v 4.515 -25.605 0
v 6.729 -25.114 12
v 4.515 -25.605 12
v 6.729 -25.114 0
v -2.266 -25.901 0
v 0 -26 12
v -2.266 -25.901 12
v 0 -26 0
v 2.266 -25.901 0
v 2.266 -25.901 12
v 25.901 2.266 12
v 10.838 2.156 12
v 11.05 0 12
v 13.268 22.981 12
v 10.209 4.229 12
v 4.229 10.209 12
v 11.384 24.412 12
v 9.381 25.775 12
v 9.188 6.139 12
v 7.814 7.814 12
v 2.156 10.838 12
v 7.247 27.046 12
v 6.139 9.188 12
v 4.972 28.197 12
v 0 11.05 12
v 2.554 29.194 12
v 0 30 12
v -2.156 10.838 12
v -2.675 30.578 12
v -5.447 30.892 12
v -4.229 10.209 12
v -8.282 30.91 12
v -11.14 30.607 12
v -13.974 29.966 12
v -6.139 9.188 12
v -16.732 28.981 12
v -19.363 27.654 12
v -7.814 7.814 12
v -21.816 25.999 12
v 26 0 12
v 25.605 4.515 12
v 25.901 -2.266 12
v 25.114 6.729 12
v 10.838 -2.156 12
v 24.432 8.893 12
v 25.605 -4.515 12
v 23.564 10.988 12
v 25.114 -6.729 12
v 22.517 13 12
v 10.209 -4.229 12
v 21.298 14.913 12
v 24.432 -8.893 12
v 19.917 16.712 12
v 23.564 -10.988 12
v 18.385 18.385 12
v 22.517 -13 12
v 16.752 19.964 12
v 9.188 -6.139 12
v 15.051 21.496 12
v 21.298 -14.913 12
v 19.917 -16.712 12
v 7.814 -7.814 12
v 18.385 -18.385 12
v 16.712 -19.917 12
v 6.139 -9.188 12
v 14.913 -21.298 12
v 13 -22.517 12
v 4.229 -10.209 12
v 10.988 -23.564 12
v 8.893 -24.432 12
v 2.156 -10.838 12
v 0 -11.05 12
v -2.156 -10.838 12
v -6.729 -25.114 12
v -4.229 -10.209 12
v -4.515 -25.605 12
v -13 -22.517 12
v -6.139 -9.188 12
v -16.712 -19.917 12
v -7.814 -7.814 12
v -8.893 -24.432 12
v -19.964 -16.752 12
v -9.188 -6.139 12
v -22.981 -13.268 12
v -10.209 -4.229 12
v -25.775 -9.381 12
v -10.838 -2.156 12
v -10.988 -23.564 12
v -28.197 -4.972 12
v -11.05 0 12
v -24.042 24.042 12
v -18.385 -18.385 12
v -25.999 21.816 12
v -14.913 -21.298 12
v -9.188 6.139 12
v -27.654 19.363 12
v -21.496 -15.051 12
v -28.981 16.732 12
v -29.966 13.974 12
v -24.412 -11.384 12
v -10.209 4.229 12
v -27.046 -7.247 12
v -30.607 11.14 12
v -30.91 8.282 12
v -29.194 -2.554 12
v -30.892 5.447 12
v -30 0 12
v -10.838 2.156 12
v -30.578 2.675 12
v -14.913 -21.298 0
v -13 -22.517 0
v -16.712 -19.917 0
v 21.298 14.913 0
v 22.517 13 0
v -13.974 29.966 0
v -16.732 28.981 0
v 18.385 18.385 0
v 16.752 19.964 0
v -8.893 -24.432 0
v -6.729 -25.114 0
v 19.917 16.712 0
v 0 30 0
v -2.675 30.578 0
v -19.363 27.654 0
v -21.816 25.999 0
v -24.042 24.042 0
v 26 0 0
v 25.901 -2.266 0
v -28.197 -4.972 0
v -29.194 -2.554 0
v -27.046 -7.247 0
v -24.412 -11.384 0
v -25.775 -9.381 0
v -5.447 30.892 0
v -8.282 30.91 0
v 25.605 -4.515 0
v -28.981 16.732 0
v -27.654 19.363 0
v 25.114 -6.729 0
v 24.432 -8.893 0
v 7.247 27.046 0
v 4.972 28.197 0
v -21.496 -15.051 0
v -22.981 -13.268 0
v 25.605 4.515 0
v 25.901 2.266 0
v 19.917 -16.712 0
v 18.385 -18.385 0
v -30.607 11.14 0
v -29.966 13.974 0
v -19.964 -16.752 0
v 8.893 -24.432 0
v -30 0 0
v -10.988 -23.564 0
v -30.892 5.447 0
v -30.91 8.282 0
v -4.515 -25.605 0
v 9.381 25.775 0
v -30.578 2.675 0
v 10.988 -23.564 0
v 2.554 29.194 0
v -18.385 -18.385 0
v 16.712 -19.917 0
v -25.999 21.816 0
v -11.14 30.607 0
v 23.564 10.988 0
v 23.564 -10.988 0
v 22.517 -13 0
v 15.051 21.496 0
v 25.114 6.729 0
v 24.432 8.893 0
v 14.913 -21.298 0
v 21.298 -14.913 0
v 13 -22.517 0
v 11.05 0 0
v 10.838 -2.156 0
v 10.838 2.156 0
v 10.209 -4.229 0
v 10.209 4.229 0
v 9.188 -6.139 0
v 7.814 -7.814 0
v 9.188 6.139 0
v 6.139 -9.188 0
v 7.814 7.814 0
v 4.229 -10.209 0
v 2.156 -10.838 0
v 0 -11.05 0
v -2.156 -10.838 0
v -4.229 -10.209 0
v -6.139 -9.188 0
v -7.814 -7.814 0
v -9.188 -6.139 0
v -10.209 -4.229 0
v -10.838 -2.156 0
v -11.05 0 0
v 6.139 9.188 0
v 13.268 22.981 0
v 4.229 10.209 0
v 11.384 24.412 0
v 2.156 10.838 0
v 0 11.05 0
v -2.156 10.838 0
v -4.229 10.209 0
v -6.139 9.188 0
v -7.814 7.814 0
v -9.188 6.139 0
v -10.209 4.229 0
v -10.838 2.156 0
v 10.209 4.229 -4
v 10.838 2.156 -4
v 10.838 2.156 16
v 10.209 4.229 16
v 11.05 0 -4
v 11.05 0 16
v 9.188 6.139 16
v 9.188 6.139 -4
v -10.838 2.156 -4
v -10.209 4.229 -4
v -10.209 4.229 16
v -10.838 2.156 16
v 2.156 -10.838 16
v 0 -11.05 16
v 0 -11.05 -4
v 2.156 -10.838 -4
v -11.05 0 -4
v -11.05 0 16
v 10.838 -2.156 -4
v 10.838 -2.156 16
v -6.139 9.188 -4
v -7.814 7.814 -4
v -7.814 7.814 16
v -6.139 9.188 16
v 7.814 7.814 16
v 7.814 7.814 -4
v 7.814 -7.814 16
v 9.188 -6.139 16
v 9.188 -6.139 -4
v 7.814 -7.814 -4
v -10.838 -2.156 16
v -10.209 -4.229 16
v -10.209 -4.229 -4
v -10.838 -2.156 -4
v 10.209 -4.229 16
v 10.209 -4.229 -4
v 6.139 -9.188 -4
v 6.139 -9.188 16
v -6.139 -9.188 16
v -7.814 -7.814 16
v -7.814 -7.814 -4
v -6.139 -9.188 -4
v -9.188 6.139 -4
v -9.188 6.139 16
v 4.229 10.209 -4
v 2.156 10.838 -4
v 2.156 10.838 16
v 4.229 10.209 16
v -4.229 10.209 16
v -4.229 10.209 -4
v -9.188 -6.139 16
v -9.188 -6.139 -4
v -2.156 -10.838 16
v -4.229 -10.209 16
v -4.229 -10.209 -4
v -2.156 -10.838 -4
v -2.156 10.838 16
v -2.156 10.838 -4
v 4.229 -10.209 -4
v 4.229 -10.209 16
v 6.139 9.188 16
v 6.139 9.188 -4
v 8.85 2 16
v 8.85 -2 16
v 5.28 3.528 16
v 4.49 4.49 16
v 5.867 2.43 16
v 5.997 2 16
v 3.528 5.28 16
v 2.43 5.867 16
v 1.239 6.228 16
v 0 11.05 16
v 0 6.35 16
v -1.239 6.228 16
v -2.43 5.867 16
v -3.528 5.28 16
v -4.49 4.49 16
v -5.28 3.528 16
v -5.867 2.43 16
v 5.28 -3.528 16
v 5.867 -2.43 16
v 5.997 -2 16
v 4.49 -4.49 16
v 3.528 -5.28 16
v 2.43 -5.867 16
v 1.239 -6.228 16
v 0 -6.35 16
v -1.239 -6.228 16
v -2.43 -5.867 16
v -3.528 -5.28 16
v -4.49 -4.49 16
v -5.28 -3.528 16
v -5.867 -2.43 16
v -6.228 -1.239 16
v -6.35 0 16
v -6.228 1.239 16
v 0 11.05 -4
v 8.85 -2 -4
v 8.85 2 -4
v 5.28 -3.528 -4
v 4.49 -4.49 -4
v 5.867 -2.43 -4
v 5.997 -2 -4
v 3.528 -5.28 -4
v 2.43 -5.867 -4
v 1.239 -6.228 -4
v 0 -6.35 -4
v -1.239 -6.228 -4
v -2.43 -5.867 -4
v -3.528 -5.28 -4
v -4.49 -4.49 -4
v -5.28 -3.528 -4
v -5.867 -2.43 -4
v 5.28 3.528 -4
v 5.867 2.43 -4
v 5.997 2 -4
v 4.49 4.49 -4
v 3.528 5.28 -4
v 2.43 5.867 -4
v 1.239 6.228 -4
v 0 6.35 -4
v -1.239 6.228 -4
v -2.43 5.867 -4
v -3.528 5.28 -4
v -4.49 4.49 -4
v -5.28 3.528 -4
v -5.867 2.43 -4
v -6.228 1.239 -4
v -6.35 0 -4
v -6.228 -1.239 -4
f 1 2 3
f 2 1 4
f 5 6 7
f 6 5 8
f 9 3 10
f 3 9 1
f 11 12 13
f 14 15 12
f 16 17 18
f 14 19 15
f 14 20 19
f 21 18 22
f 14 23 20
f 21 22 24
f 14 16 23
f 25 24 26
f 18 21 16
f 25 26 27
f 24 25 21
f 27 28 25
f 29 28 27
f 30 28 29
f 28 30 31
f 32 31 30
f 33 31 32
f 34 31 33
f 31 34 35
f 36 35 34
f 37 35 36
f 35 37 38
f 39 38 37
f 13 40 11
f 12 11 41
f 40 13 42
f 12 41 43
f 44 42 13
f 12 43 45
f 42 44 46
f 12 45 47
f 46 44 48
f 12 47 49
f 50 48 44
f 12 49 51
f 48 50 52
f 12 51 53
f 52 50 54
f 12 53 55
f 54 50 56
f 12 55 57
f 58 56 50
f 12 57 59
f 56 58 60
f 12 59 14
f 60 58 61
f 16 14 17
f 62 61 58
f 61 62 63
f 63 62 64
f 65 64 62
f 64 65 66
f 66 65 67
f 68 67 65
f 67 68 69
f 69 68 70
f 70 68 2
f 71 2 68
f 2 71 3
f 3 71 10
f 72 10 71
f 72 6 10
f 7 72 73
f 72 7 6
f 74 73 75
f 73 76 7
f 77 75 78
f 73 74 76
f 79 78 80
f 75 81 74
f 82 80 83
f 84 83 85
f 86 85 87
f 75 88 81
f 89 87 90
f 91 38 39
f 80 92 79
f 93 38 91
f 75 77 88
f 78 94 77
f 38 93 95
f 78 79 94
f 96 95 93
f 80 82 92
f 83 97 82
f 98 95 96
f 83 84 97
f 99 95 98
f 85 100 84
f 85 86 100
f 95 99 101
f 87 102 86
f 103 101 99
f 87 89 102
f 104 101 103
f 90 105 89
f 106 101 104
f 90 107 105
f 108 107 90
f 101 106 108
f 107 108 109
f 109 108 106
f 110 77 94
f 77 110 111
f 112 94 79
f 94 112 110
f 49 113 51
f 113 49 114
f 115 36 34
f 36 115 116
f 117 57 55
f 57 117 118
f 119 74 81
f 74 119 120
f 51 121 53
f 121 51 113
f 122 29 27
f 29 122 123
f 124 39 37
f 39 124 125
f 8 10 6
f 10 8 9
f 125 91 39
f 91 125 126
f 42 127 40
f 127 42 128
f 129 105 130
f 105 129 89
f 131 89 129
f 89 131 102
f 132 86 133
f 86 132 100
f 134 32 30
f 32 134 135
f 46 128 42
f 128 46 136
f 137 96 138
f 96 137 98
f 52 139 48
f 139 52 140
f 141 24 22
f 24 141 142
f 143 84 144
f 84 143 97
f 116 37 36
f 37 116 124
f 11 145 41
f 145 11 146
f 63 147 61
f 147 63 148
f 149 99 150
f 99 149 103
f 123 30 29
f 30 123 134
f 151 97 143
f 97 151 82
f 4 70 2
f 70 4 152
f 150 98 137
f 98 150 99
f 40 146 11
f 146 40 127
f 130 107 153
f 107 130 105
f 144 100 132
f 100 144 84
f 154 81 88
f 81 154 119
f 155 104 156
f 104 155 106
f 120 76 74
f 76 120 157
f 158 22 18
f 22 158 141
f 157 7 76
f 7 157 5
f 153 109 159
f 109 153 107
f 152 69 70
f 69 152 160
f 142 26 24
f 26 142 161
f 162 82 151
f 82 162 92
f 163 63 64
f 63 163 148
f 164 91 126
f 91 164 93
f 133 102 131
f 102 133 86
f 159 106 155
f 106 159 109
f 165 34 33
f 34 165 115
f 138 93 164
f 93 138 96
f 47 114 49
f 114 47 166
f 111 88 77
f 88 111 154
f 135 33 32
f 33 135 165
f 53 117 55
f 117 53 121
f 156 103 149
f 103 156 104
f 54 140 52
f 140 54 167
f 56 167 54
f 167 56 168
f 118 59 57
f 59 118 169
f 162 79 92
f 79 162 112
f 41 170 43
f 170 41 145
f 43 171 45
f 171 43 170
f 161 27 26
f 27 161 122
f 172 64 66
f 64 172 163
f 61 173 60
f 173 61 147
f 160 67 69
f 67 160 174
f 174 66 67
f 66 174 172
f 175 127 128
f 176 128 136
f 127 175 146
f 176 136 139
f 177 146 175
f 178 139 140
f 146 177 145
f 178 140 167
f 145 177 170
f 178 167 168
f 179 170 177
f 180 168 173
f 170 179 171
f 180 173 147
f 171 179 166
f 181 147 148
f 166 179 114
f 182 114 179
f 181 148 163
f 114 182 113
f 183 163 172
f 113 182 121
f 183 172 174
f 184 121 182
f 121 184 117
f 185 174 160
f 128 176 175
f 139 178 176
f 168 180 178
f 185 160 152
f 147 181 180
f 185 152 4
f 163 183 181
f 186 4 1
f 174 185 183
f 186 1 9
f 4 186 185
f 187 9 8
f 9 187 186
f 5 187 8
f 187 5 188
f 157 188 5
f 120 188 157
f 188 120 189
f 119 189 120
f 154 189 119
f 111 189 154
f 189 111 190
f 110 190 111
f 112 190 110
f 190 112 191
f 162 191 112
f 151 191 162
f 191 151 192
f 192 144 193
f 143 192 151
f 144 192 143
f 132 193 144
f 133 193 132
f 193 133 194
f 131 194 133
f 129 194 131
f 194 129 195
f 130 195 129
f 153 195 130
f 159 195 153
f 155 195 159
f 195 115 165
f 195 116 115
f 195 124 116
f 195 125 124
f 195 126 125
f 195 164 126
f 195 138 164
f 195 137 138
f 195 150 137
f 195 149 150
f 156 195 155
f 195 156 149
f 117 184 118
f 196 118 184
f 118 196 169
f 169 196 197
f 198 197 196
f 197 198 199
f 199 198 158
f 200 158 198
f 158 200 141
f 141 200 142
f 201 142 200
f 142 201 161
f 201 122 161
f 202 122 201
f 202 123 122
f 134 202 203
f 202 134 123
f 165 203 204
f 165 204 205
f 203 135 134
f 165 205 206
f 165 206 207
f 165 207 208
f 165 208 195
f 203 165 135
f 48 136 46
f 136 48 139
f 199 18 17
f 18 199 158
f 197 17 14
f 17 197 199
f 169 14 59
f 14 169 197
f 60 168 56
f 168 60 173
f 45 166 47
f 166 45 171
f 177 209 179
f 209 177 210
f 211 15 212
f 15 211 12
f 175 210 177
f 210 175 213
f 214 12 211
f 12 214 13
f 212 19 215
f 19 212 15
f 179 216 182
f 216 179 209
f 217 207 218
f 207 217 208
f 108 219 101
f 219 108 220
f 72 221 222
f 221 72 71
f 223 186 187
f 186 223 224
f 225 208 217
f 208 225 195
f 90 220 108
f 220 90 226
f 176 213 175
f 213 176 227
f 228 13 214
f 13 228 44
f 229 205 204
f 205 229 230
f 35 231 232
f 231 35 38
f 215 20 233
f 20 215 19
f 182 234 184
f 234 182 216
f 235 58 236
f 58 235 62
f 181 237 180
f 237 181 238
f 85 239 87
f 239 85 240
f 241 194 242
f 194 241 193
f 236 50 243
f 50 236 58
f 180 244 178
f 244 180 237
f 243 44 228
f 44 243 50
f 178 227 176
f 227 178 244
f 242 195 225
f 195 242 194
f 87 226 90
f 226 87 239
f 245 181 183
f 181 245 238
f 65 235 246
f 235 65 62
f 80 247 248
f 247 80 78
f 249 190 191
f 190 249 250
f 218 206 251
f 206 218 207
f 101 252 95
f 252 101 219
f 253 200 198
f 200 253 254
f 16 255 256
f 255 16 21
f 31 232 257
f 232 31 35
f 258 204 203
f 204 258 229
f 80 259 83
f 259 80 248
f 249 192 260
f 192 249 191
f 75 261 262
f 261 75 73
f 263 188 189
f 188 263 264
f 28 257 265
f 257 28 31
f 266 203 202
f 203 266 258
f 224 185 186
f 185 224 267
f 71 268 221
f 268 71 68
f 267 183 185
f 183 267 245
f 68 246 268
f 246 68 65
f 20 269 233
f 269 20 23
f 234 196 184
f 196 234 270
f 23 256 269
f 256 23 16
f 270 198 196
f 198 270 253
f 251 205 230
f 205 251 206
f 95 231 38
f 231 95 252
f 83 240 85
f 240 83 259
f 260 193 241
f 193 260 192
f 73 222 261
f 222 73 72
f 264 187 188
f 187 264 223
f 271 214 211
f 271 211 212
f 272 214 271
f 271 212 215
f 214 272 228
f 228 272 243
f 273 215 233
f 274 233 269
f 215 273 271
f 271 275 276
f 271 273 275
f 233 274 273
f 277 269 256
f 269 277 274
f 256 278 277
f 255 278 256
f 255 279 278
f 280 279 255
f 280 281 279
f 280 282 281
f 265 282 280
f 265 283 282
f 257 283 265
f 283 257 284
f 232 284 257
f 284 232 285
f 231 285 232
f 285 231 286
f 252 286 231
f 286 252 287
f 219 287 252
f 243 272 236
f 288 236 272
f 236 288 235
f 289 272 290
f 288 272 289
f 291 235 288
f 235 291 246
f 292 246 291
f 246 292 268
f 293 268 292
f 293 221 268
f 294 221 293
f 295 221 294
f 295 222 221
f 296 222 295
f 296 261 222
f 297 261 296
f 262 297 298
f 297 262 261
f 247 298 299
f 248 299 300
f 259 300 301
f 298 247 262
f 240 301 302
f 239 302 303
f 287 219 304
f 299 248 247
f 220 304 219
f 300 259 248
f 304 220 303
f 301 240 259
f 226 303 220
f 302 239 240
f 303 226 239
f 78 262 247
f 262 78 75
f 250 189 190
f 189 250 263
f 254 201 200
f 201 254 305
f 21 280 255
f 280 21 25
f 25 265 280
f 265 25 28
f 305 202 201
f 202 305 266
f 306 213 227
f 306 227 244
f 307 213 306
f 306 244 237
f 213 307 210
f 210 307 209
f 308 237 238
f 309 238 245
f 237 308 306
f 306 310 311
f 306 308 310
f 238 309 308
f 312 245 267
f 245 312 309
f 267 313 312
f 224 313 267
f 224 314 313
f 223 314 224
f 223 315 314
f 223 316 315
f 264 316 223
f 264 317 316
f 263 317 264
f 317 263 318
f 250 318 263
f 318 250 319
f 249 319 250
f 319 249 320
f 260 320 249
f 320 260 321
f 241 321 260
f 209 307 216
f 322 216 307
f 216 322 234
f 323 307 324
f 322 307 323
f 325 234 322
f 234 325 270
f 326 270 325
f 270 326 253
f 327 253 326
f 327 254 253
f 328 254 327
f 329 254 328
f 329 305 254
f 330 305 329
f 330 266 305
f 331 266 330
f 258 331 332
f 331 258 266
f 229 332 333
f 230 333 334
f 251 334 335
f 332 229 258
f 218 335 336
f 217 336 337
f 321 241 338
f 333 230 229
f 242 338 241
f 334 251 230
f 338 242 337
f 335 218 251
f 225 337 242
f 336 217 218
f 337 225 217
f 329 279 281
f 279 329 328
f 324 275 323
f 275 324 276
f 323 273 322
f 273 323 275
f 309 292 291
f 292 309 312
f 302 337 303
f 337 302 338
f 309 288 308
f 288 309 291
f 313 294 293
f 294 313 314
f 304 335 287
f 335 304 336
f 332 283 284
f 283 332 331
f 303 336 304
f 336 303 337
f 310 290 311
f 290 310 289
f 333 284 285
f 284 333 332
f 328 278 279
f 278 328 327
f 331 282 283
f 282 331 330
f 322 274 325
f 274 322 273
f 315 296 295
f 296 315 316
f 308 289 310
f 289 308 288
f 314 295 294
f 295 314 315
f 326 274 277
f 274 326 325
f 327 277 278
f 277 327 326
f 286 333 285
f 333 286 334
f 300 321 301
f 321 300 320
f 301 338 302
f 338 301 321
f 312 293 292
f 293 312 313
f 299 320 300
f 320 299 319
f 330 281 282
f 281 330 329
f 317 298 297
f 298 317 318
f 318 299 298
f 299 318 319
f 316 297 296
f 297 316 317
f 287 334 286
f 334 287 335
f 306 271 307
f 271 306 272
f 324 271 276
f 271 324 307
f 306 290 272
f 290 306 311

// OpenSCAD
$fn = 32;

// ----------------------------------------------------------------------
// Cam: base radius 26 mm with a 8 mm lift over 180 degrees
// ----------------------------------------------------------------------

// --- parameters (mm) ---
base_r = 26;              // base radius
lift = 8;                 // lift height above the base radius
lift_span = 180;          // angular width of the lift
lift_start = 45;          // angle where the lift starts
cam_t = 12;               // cam plate thickness
hub_d = 22.1;             // hub diameter
hub_h = 20;               // hub height
bore_d = 12.7;            // bore
key_w = 4;                // keyway width
key_depth = 2;            // keyway depth

cam_profile = [[26, 0], [25.901, 2.266], [25.605, 4.515], [25.114, 6.729], [24.432, 8.893], [23.564, 10.988], [22.517, 13], [21.298, 14.913], [19.917, 16.712], [18.385, 18.385], [16.752, 19.964], [15.051, 21.496], [13.268, 22.981], [11.384, 24.412], [9.381, 25.775], [7.247, 27.046], [4.972, 28.197], [2.554, 29.194], [0, 30], [-2.675, 30.578], [-5.447, 30.892], [-8.282, 30.91], [-11.14, 30.607], [-13.974, 29.966], [-16.732, 28.981], [-19.363, 27.654], [-21.816, 25.999], [-24.042, 24.042], [-25.999, 21.816], [-27.654, 19.363], [-28.981, 16.732], [-29.966, 13.974], [-30.607, 11.14], [-30.91, 8.282], [-30.892, 5.447], [-30.578, 2.675], [-30, 0], [-29.194, -2.554], [-28.197, -4.972], [-27.046, -7.247], [-25.775, -9.381], [-24.412, -11.384], [-22.981, -13.268], [-21.496, -15.051], [-19.964, -16.752], [-18.385, -18.385], [-16.712, -19.917], [-14.913, -21.298], [-13, -22.517], [-10.988, -23.564], [-8.893, -24.432], [-6.729, -25.114], [-4.515, -25.605], [-2.266, -25.901], [0, -26], [2.266, -25.901], [4.515, -25.605], [6.729, -25.114], [8.893, -24.432], [10.988, -23.564], [13, -22.517], [14.913, -21.298], [16.712, -19.917], [18.385, -18.385], [19.917, -16.712], [21.298, -14.913], [22.517, -13], [23.564, -10.988], [24.432, -8.893], [25.114, -6.729], [25.605, -4.515], [25.901, -2.266]];

difference() {
  union() {
    linear_extrude(height = cam_t) polygon(cam_profile);
    /* hub, proud of the cam plate on both sides */
    translate([0, 0, -4]) cylinder(h = hub_h, d = hub_d);
  }
  /* bore through the hub, 2.5 mm clear on both faces */
  translate([0, 0, -6.5]) cylinder(h = hub_h + 5, d = bore_d);
  /* keyway, milled through the whole hub */
  translate([4.35, -2, -6.5]) cube([4.5, 4, 25]);
}
